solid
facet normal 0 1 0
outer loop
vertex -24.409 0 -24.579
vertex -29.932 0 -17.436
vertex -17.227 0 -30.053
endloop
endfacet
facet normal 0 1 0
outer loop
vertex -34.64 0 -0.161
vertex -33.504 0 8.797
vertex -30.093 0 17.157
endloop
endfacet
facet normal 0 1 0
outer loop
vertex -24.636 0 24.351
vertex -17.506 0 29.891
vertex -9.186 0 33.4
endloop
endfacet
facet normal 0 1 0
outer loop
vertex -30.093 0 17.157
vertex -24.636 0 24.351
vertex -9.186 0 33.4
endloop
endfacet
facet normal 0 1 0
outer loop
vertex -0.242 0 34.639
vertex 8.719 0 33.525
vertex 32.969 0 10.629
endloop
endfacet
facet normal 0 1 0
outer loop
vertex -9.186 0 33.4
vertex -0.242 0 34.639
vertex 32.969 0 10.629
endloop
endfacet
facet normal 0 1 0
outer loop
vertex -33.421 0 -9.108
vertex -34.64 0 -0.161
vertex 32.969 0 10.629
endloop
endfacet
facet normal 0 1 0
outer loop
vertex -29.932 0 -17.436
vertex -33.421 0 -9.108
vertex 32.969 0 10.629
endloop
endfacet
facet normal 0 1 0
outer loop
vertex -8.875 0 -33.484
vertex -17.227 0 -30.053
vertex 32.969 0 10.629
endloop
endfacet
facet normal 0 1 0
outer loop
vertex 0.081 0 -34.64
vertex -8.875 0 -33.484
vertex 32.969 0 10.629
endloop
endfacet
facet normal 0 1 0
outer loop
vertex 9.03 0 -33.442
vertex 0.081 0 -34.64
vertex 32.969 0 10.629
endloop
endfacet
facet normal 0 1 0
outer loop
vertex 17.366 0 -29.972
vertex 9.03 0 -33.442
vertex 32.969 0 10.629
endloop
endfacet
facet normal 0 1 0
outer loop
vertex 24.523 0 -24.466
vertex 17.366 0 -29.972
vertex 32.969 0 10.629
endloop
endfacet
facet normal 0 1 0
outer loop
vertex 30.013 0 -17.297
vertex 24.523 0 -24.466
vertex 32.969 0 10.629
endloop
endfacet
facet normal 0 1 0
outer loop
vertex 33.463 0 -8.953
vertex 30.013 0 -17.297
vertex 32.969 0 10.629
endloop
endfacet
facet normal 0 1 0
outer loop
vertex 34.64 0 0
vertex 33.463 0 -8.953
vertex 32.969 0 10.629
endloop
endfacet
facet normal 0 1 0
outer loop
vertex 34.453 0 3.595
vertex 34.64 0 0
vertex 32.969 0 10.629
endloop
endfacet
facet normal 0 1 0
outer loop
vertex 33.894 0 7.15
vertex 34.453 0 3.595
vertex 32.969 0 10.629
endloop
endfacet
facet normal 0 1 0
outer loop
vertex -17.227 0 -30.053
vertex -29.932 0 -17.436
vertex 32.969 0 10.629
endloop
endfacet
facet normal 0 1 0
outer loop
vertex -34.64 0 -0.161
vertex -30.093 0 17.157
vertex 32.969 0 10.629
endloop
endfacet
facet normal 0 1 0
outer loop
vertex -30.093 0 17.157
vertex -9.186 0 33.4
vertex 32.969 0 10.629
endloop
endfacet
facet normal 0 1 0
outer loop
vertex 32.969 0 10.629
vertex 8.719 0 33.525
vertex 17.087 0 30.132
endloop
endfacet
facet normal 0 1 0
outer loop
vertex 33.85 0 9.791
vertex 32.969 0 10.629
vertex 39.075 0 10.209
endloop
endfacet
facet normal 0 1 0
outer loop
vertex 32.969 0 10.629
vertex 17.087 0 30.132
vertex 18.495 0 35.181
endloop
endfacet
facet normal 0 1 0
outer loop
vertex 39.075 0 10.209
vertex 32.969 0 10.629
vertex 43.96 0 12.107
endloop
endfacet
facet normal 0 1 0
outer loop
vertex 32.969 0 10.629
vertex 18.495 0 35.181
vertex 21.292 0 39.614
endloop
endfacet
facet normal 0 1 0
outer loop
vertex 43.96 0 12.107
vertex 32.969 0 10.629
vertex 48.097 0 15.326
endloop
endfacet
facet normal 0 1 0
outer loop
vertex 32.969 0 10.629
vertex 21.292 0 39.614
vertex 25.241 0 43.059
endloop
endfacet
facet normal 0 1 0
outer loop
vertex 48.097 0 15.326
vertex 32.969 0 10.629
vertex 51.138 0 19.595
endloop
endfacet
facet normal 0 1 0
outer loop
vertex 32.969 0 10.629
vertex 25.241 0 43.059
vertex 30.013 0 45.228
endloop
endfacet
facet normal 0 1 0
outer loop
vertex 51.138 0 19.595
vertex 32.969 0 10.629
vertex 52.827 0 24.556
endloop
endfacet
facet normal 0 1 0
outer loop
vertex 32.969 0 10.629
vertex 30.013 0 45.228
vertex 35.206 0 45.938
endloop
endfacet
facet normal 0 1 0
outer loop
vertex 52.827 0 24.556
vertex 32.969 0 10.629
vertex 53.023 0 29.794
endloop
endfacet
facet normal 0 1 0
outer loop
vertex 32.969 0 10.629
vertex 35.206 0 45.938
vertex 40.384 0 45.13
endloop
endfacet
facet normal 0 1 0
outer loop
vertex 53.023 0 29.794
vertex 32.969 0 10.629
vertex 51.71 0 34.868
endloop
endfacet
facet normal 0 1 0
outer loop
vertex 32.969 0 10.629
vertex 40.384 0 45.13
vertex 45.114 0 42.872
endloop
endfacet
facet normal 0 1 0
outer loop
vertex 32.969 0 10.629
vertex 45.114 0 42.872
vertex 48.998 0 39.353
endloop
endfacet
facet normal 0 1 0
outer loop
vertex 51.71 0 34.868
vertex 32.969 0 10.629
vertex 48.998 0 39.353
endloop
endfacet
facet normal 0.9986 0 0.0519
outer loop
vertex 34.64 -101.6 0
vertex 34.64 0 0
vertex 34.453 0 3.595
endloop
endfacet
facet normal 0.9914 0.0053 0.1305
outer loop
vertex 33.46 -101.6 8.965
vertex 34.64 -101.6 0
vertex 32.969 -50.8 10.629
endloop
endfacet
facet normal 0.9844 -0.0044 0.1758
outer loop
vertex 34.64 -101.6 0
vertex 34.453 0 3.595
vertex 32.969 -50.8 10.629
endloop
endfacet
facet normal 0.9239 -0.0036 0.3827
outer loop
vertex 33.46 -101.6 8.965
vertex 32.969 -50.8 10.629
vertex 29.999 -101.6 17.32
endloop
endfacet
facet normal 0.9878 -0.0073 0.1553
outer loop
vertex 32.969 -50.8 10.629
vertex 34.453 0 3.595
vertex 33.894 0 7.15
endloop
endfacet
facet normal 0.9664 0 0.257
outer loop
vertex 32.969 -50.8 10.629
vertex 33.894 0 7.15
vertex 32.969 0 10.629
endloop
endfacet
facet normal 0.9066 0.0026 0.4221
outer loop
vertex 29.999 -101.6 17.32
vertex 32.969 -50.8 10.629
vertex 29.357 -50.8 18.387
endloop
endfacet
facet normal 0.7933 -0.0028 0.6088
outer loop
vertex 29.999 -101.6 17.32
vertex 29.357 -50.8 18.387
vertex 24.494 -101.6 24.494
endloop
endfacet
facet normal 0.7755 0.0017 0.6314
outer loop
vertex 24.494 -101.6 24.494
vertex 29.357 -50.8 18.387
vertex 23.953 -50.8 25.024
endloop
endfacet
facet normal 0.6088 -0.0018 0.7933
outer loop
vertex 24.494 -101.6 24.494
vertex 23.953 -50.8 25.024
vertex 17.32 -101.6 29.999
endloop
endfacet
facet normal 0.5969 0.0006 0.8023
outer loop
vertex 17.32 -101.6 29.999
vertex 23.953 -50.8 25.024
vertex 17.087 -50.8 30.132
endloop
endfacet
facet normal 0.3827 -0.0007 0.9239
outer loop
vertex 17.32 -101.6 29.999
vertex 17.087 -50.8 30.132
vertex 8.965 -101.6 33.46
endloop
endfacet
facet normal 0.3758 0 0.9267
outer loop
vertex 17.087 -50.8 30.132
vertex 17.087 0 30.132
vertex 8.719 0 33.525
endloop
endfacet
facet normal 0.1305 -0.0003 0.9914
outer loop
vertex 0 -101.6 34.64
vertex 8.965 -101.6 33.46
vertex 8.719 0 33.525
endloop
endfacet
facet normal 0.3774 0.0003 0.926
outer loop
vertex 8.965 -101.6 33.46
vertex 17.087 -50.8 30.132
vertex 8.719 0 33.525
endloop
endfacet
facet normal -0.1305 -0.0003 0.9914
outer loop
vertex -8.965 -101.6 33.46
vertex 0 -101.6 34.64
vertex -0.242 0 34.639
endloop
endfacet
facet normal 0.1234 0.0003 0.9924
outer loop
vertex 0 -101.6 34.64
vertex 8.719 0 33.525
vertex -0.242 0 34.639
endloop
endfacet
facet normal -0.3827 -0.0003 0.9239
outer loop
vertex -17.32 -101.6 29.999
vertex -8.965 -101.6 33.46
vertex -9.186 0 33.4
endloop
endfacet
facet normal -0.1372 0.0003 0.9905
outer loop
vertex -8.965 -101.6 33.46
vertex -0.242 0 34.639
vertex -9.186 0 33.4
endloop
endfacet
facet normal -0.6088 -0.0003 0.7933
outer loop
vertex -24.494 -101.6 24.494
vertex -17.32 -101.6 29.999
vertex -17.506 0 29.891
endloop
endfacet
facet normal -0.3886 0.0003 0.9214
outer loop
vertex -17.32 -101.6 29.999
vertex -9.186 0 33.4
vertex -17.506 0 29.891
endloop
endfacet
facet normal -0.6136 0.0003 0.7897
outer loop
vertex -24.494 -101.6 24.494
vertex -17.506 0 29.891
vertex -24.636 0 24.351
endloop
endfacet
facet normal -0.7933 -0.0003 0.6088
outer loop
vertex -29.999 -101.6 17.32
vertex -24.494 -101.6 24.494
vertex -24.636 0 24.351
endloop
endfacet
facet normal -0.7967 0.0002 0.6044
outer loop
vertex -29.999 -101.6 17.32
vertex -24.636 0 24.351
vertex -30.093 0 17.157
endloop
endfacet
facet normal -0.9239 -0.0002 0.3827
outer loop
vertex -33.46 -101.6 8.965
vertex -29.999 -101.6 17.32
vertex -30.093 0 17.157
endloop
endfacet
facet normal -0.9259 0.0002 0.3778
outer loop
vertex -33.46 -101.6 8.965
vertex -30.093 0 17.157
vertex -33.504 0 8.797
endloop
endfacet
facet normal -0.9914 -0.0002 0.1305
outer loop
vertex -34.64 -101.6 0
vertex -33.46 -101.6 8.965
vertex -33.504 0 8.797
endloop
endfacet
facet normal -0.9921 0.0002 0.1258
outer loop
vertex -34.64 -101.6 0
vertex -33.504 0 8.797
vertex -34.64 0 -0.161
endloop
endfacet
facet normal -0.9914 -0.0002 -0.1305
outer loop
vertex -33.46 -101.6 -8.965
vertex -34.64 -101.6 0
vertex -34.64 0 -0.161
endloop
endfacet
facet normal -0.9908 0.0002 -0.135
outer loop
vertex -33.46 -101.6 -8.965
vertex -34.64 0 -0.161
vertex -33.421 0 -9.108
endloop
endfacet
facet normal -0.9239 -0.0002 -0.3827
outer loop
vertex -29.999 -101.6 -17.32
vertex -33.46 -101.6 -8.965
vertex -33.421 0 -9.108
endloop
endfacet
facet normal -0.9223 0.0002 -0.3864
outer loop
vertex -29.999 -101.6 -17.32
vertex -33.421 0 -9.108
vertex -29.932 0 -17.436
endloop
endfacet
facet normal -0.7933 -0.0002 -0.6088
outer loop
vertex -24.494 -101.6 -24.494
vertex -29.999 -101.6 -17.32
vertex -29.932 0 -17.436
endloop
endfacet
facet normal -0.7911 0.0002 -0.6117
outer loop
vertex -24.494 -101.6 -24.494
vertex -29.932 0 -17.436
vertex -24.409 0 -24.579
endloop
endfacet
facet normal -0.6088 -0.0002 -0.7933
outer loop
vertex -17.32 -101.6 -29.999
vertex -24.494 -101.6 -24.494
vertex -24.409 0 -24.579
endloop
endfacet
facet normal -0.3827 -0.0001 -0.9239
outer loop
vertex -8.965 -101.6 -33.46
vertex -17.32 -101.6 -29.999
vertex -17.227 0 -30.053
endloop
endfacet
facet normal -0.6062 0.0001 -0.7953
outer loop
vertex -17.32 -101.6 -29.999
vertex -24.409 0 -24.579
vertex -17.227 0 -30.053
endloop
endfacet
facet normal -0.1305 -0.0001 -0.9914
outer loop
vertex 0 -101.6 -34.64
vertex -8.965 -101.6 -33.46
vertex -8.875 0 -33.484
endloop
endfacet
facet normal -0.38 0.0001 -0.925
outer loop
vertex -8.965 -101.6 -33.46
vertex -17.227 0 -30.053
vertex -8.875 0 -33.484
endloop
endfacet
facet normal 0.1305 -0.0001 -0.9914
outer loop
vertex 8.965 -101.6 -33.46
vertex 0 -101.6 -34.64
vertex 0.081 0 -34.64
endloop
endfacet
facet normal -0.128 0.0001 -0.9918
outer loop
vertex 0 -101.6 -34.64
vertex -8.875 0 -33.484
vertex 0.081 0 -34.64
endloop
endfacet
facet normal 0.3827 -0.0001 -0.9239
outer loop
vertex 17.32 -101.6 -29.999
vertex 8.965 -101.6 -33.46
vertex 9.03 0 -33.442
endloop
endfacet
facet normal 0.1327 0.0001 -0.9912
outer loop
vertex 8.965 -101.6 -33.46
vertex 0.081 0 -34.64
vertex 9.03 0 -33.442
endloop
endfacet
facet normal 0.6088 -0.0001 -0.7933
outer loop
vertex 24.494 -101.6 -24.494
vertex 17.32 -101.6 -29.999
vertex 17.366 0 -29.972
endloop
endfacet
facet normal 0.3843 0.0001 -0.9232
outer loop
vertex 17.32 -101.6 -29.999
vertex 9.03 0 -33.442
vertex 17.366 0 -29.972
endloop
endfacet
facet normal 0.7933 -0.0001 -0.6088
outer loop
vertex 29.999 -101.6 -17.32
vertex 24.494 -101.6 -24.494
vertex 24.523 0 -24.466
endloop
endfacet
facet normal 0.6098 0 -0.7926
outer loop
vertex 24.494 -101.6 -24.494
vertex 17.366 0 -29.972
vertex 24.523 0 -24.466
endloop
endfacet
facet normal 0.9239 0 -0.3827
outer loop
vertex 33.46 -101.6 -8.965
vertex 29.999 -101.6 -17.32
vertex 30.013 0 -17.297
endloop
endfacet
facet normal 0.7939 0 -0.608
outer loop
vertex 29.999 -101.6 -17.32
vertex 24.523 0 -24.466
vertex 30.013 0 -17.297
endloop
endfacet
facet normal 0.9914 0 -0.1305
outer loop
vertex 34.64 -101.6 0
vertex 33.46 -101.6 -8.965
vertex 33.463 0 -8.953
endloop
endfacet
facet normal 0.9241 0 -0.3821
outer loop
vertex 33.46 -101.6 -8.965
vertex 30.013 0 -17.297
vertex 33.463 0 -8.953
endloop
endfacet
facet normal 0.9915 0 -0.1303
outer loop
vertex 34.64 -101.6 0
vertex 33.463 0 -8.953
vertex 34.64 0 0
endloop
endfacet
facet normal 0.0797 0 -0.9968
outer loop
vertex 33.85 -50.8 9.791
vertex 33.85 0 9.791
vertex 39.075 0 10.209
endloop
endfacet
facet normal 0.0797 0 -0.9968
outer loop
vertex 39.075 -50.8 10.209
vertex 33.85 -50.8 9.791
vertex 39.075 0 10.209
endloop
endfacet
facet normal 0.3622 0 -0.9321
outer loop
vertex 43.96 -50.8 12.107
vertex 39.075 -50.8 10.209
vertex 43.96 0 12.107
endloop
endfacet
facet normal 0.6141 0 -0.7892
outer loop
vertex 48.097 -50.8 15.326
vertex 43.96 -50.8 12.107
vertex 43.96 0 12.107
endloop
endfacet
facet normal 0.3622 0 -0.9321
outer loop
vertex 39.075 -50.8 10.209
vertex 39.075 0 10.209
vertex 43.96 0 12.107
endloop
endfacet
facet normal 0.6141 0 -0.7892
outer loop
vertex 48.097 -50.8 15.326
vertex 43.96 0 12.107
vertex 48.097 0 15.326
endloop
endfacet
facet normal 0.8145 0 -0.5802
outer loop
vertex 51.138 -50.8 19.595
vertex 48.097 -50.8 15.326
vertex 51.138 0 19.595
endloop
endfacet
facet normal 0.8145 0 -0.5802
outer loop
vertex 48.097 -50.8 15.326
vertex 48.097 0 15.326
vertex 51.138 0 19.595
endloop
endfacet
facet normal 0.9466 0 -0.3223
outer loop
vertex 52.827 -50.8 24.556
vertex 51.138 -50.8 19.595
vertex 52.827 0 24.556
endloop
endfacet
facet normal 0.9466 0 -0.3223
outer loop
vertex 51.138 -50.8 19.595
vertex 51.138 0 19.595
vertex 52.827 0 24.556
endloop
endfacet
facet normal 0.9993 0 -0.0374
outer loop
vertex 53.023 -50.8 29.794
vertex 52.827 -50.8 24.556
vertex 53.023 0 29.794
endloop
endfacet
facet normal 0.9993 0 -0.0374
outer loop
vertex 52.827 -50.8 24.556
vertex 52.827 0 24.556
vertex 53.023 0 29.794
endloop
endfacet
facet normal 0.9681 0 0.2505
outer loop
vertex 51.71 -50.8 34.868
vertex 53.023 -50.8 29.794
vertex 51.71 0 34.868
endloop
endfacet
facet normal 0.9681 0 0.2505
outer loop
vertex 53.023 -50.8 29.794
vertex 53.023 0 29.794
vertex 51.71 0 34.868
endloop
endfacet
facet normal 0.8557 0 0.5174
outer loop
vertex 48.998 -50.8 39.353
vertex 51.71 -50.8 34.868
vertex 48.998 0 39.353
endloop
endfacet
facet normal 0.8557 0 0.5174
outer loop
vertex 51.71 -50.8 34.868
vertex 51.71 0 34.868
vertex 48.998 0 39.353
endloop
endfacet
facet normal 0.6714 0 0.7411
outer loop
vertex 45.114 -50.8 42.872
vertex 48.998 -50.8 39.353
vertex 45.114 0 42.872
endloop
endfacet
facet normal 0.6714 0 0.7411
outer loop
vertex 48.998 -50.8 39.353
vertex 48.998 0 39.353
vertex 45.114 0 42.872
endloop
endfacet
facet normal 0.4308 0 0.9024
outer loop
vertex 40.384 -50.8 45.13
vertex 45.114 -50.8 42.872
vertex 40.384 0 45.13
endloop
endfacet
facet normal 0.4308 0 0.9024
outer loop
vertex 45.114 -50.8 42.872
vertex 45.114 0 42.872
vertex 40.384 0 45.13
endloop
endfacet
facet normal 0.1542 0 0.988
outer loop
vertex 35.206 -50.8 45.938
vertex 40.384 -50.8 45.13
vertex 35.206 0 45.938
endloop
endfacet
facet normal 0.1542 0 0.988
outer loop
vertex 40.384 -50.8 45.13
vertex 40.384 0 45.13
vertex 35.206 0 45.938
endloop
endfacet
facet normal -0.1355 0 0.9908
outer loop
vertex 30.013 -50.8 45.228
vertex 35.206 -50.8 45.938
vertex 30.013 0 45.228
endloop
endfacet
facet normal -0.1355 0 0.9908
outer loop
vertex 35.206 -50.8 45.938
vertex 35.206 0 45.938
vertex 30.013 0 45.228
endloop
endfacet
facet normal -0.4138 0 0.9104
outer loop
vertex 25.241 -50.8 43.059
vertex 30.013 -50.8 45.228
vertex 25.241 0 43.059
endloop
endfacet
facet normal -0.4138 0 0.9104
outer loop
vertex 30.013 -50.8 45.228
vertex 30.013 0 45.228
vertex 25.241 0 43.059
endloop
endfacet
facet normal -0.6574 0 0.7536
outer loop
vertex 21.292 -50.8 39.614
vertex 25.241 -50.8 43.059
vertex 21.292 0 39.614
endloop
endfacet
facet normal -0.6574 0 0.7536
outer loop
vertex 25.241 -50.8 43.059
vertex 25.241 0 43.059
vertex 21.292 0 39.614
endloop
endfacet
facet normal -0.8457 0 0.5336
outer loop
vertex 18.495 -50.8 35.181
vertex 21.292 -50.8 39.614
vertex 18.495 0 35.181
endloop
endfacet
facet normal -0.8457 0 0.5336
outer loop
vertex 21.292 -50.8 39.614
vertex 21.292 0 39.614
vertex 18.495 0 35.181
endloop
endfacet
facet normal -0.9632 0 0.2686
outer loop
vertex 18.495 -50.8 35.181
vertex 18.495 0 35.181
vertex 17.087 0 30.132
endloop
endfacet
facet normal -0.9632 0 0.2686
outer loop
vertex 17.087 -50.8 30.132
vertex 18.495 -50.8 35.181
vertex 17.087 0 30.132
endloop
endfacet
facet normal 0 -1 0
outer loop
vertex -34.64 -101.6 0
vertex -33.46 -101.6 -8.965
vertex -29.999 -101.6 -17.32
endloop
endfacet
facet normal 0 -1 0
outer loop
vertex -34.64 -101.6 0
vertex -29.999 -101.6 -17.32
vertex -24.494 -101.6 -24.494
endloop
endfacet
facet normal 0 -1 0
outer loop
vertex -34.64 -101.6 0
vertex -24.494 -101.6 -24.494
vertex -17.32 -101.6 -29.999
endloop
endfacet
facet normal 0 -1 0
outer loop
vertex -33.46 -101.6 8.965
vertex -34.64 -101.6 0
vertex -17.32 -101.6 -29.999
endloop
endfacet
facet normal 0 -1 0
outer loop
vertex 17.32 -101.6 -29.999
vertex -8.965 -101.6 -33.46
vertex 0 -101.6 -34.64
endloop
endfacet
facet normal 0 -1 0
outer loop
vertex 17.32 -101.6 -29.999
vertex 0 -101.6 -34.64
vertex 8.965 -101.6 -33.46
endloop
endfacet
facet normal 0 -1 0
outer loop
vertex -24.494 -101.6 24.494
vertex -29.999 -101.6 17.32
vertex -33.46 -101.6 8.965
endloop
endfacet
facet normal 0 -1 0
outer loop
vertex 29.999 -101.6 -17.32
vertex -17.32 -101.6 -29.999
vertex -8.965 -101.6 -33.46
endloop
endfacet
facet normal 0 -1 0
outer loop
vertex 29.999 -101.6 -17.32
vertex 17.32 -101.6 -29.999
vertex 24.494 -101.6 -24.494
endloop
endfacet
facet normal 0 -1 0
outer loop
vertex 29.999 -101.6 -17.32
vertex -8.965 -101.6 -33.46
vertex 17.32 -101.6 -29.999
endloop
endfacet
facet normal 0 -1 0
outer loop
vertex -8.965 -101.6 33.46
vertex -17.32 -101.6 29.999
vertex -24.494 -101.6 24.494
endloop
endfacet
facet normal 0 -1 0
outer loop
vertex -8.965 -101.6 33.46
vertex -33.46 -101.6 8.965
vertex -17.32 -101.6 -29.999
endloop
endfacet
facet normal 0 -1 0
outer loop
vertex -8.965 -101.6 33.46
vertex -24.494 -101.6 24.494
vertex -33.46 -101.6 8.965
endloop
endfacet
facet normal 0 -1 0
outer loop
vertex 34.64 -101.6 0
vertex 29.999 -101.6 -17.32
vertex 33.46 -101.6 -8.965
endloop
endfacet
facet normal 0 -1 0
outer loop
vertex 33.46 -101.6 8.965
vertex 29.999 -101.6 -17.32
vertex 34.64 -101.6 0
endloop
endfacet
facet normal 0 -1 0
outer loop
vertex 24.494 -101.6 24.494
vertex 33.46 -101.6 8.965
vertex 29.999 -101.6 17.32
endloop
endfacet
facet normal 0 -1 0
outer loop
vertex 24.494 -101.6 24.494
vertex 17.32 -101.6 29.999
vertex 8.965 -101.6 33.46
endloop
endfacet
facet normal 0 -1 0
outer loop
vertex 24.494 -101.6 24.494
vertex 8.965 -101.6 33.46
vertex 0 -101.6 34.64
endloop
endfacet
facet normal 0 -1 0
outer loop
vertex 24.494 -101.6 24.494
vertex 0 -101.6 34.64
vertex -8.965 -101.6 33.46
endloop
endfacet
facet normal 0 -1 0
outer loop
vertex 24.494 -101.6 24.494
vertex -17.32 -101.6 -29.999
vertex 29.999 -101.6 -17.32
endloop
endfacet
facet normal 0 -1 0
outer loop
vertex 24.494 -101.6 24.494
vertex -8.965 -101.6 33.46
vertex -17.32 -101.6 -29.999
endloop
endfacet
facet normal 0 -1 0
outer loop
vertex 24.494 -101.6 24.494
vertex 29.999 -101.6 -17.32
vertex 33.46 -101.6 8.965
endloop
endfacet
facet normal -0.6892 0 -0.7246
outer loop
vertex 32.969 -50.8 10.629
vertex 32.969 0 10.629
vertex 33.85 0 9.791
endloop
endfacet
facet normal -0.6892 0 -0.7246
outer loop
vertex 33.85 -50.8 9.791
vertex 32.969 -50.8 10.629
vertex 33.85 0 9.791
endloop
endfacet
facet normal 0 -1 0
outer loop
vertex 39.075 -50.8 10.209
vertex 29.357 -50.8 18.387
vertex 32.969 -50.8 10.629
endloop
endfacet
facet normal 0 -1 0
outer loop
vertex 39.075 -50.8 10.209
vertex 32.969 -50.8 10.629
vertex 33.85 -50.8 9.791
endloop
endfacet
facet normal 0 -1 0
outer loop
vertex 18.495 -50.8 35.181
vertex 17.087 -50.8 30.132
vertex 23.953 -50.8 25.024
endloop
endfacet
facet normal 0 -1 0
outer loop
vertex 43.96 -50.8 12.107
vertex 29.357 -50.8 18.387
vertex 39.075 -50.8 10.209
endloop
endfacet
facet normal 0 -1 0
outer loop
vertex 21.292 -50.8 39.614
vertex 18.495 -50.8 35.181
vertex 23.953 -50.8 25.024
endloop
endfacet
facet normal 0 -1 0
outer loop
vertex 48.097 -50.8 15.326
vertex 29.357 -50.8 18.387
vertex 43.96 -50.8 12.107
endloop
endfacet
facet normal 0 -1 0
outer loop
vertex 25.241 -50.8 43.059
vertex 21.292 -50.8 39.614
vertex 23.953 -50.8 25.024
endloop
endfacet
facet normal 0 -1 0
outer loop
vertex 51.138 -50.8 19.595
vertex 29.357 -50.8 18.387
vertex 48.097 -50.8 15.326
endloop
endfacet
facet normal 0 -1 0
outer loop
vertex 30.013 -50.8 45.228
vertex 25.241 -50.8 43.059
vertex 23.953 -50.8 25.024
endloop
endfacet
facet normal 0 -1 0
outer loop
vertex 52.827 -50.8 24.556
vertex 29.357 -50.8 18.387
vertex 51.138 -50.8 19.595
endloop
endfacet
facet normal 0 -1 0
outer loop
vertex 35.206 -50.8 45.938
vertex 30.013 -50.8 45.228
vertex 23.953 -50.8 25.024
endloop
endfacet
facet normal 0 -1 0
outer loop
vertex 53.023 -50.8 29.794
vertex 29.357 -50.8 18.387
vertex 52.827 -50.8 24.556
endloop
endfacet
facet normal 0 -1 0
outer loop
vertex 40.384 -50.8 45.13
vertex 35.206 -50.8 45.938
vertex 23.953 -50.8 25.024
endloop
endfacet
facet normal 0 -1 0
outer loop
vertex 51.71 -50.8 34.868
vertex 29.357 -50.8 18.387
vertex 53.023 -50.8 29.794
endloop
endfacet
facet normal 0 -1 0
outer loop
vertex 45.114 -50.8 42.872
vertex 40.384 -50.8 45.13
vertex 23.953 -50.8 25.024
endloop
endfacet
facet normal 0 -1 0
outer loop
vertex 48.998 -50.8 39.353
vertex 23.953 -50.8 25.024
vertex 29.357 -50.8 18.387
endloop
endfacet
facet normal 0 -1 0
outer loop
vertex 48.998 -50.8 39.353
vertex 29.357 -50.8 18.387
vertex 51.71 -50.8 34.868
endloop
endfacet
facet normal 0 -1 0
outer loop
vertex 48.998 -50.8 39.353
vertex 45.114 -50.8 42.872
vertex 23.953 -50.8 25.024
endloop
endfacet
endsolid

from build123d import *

# Parameters (mm, degrees)
F0_R      = 34.6399806849
F1_DEPTH  = 50.8
F2_DEPTH  = 50.8
F4_DEPTH  = 25.4
F5_DEPTH  = 50.8
F6_DEPTH  = 25.4
F7_R      = 26.5192629278
F8_DEPTH  = 25.4
F9_R      = 25.3977072723
F10_DEPTH = 25.4


with BuildPart() as f1:
    # F0 (on Front) → F1 (new body)
    with BuildSketch(Plane.XZ):
        Circle(F0_R)
    extrude(amount=F1_DEPTH)

    # F2 (add): a face of the model
    f2_faces = [f1.faces().sort_by_distance(p)[0] for p in [
        (0, -50.8, 0),
    ]]
    extrude(f2_faces, amount=F2_DEPTH)

    # F3 (on Front) → F4 (join)
    with BuildSketch(Plane.XZ):
        with BuildLine():
            Line((17.0650705695, 25.7374811918), (33.8503867388, 9.7914338112))
            ThreePointArc((33.8503867388, 9.7914338112), (47.4968674715, 40.9635553292), (17.0650705695, 25.7374811918))
        make_face()
    extrude(amount=F4_DEPTH)

    # F5 (add): a face of the model
    f5_faces = [f1.faces().sort_by_distance(p)[0] for p in [
        (7.0012928433, 0, 5.5654888529),
    ]]
    extrude(f5_faces, amount=-F5_DEPTH)

    # F6 (add): a face of the model
    f6_faces = [f1.faces().sort_by_distance(p)[0] for p in [
        (7.0012928433, 0, 5.5654888529),
    ]]
    extrude(f6_faces, amount=-F6_DEPTH)

    # F7 (on Front) → F8 (cut)
    with BuildSketch(Plane.XZ):
        Circle(F7_R)
    extrude(amount=-F8_DEPTH, mode=Mode.SUBTRACT)

    # F9 (on Front) → F10 (cut)
    with BuildSketch(Plane.XZ):
        Circle(F9_R)
    extrude(amount=-F10_DEPTH, mode=Mode.SUBTRACT)


solid = f1.part
